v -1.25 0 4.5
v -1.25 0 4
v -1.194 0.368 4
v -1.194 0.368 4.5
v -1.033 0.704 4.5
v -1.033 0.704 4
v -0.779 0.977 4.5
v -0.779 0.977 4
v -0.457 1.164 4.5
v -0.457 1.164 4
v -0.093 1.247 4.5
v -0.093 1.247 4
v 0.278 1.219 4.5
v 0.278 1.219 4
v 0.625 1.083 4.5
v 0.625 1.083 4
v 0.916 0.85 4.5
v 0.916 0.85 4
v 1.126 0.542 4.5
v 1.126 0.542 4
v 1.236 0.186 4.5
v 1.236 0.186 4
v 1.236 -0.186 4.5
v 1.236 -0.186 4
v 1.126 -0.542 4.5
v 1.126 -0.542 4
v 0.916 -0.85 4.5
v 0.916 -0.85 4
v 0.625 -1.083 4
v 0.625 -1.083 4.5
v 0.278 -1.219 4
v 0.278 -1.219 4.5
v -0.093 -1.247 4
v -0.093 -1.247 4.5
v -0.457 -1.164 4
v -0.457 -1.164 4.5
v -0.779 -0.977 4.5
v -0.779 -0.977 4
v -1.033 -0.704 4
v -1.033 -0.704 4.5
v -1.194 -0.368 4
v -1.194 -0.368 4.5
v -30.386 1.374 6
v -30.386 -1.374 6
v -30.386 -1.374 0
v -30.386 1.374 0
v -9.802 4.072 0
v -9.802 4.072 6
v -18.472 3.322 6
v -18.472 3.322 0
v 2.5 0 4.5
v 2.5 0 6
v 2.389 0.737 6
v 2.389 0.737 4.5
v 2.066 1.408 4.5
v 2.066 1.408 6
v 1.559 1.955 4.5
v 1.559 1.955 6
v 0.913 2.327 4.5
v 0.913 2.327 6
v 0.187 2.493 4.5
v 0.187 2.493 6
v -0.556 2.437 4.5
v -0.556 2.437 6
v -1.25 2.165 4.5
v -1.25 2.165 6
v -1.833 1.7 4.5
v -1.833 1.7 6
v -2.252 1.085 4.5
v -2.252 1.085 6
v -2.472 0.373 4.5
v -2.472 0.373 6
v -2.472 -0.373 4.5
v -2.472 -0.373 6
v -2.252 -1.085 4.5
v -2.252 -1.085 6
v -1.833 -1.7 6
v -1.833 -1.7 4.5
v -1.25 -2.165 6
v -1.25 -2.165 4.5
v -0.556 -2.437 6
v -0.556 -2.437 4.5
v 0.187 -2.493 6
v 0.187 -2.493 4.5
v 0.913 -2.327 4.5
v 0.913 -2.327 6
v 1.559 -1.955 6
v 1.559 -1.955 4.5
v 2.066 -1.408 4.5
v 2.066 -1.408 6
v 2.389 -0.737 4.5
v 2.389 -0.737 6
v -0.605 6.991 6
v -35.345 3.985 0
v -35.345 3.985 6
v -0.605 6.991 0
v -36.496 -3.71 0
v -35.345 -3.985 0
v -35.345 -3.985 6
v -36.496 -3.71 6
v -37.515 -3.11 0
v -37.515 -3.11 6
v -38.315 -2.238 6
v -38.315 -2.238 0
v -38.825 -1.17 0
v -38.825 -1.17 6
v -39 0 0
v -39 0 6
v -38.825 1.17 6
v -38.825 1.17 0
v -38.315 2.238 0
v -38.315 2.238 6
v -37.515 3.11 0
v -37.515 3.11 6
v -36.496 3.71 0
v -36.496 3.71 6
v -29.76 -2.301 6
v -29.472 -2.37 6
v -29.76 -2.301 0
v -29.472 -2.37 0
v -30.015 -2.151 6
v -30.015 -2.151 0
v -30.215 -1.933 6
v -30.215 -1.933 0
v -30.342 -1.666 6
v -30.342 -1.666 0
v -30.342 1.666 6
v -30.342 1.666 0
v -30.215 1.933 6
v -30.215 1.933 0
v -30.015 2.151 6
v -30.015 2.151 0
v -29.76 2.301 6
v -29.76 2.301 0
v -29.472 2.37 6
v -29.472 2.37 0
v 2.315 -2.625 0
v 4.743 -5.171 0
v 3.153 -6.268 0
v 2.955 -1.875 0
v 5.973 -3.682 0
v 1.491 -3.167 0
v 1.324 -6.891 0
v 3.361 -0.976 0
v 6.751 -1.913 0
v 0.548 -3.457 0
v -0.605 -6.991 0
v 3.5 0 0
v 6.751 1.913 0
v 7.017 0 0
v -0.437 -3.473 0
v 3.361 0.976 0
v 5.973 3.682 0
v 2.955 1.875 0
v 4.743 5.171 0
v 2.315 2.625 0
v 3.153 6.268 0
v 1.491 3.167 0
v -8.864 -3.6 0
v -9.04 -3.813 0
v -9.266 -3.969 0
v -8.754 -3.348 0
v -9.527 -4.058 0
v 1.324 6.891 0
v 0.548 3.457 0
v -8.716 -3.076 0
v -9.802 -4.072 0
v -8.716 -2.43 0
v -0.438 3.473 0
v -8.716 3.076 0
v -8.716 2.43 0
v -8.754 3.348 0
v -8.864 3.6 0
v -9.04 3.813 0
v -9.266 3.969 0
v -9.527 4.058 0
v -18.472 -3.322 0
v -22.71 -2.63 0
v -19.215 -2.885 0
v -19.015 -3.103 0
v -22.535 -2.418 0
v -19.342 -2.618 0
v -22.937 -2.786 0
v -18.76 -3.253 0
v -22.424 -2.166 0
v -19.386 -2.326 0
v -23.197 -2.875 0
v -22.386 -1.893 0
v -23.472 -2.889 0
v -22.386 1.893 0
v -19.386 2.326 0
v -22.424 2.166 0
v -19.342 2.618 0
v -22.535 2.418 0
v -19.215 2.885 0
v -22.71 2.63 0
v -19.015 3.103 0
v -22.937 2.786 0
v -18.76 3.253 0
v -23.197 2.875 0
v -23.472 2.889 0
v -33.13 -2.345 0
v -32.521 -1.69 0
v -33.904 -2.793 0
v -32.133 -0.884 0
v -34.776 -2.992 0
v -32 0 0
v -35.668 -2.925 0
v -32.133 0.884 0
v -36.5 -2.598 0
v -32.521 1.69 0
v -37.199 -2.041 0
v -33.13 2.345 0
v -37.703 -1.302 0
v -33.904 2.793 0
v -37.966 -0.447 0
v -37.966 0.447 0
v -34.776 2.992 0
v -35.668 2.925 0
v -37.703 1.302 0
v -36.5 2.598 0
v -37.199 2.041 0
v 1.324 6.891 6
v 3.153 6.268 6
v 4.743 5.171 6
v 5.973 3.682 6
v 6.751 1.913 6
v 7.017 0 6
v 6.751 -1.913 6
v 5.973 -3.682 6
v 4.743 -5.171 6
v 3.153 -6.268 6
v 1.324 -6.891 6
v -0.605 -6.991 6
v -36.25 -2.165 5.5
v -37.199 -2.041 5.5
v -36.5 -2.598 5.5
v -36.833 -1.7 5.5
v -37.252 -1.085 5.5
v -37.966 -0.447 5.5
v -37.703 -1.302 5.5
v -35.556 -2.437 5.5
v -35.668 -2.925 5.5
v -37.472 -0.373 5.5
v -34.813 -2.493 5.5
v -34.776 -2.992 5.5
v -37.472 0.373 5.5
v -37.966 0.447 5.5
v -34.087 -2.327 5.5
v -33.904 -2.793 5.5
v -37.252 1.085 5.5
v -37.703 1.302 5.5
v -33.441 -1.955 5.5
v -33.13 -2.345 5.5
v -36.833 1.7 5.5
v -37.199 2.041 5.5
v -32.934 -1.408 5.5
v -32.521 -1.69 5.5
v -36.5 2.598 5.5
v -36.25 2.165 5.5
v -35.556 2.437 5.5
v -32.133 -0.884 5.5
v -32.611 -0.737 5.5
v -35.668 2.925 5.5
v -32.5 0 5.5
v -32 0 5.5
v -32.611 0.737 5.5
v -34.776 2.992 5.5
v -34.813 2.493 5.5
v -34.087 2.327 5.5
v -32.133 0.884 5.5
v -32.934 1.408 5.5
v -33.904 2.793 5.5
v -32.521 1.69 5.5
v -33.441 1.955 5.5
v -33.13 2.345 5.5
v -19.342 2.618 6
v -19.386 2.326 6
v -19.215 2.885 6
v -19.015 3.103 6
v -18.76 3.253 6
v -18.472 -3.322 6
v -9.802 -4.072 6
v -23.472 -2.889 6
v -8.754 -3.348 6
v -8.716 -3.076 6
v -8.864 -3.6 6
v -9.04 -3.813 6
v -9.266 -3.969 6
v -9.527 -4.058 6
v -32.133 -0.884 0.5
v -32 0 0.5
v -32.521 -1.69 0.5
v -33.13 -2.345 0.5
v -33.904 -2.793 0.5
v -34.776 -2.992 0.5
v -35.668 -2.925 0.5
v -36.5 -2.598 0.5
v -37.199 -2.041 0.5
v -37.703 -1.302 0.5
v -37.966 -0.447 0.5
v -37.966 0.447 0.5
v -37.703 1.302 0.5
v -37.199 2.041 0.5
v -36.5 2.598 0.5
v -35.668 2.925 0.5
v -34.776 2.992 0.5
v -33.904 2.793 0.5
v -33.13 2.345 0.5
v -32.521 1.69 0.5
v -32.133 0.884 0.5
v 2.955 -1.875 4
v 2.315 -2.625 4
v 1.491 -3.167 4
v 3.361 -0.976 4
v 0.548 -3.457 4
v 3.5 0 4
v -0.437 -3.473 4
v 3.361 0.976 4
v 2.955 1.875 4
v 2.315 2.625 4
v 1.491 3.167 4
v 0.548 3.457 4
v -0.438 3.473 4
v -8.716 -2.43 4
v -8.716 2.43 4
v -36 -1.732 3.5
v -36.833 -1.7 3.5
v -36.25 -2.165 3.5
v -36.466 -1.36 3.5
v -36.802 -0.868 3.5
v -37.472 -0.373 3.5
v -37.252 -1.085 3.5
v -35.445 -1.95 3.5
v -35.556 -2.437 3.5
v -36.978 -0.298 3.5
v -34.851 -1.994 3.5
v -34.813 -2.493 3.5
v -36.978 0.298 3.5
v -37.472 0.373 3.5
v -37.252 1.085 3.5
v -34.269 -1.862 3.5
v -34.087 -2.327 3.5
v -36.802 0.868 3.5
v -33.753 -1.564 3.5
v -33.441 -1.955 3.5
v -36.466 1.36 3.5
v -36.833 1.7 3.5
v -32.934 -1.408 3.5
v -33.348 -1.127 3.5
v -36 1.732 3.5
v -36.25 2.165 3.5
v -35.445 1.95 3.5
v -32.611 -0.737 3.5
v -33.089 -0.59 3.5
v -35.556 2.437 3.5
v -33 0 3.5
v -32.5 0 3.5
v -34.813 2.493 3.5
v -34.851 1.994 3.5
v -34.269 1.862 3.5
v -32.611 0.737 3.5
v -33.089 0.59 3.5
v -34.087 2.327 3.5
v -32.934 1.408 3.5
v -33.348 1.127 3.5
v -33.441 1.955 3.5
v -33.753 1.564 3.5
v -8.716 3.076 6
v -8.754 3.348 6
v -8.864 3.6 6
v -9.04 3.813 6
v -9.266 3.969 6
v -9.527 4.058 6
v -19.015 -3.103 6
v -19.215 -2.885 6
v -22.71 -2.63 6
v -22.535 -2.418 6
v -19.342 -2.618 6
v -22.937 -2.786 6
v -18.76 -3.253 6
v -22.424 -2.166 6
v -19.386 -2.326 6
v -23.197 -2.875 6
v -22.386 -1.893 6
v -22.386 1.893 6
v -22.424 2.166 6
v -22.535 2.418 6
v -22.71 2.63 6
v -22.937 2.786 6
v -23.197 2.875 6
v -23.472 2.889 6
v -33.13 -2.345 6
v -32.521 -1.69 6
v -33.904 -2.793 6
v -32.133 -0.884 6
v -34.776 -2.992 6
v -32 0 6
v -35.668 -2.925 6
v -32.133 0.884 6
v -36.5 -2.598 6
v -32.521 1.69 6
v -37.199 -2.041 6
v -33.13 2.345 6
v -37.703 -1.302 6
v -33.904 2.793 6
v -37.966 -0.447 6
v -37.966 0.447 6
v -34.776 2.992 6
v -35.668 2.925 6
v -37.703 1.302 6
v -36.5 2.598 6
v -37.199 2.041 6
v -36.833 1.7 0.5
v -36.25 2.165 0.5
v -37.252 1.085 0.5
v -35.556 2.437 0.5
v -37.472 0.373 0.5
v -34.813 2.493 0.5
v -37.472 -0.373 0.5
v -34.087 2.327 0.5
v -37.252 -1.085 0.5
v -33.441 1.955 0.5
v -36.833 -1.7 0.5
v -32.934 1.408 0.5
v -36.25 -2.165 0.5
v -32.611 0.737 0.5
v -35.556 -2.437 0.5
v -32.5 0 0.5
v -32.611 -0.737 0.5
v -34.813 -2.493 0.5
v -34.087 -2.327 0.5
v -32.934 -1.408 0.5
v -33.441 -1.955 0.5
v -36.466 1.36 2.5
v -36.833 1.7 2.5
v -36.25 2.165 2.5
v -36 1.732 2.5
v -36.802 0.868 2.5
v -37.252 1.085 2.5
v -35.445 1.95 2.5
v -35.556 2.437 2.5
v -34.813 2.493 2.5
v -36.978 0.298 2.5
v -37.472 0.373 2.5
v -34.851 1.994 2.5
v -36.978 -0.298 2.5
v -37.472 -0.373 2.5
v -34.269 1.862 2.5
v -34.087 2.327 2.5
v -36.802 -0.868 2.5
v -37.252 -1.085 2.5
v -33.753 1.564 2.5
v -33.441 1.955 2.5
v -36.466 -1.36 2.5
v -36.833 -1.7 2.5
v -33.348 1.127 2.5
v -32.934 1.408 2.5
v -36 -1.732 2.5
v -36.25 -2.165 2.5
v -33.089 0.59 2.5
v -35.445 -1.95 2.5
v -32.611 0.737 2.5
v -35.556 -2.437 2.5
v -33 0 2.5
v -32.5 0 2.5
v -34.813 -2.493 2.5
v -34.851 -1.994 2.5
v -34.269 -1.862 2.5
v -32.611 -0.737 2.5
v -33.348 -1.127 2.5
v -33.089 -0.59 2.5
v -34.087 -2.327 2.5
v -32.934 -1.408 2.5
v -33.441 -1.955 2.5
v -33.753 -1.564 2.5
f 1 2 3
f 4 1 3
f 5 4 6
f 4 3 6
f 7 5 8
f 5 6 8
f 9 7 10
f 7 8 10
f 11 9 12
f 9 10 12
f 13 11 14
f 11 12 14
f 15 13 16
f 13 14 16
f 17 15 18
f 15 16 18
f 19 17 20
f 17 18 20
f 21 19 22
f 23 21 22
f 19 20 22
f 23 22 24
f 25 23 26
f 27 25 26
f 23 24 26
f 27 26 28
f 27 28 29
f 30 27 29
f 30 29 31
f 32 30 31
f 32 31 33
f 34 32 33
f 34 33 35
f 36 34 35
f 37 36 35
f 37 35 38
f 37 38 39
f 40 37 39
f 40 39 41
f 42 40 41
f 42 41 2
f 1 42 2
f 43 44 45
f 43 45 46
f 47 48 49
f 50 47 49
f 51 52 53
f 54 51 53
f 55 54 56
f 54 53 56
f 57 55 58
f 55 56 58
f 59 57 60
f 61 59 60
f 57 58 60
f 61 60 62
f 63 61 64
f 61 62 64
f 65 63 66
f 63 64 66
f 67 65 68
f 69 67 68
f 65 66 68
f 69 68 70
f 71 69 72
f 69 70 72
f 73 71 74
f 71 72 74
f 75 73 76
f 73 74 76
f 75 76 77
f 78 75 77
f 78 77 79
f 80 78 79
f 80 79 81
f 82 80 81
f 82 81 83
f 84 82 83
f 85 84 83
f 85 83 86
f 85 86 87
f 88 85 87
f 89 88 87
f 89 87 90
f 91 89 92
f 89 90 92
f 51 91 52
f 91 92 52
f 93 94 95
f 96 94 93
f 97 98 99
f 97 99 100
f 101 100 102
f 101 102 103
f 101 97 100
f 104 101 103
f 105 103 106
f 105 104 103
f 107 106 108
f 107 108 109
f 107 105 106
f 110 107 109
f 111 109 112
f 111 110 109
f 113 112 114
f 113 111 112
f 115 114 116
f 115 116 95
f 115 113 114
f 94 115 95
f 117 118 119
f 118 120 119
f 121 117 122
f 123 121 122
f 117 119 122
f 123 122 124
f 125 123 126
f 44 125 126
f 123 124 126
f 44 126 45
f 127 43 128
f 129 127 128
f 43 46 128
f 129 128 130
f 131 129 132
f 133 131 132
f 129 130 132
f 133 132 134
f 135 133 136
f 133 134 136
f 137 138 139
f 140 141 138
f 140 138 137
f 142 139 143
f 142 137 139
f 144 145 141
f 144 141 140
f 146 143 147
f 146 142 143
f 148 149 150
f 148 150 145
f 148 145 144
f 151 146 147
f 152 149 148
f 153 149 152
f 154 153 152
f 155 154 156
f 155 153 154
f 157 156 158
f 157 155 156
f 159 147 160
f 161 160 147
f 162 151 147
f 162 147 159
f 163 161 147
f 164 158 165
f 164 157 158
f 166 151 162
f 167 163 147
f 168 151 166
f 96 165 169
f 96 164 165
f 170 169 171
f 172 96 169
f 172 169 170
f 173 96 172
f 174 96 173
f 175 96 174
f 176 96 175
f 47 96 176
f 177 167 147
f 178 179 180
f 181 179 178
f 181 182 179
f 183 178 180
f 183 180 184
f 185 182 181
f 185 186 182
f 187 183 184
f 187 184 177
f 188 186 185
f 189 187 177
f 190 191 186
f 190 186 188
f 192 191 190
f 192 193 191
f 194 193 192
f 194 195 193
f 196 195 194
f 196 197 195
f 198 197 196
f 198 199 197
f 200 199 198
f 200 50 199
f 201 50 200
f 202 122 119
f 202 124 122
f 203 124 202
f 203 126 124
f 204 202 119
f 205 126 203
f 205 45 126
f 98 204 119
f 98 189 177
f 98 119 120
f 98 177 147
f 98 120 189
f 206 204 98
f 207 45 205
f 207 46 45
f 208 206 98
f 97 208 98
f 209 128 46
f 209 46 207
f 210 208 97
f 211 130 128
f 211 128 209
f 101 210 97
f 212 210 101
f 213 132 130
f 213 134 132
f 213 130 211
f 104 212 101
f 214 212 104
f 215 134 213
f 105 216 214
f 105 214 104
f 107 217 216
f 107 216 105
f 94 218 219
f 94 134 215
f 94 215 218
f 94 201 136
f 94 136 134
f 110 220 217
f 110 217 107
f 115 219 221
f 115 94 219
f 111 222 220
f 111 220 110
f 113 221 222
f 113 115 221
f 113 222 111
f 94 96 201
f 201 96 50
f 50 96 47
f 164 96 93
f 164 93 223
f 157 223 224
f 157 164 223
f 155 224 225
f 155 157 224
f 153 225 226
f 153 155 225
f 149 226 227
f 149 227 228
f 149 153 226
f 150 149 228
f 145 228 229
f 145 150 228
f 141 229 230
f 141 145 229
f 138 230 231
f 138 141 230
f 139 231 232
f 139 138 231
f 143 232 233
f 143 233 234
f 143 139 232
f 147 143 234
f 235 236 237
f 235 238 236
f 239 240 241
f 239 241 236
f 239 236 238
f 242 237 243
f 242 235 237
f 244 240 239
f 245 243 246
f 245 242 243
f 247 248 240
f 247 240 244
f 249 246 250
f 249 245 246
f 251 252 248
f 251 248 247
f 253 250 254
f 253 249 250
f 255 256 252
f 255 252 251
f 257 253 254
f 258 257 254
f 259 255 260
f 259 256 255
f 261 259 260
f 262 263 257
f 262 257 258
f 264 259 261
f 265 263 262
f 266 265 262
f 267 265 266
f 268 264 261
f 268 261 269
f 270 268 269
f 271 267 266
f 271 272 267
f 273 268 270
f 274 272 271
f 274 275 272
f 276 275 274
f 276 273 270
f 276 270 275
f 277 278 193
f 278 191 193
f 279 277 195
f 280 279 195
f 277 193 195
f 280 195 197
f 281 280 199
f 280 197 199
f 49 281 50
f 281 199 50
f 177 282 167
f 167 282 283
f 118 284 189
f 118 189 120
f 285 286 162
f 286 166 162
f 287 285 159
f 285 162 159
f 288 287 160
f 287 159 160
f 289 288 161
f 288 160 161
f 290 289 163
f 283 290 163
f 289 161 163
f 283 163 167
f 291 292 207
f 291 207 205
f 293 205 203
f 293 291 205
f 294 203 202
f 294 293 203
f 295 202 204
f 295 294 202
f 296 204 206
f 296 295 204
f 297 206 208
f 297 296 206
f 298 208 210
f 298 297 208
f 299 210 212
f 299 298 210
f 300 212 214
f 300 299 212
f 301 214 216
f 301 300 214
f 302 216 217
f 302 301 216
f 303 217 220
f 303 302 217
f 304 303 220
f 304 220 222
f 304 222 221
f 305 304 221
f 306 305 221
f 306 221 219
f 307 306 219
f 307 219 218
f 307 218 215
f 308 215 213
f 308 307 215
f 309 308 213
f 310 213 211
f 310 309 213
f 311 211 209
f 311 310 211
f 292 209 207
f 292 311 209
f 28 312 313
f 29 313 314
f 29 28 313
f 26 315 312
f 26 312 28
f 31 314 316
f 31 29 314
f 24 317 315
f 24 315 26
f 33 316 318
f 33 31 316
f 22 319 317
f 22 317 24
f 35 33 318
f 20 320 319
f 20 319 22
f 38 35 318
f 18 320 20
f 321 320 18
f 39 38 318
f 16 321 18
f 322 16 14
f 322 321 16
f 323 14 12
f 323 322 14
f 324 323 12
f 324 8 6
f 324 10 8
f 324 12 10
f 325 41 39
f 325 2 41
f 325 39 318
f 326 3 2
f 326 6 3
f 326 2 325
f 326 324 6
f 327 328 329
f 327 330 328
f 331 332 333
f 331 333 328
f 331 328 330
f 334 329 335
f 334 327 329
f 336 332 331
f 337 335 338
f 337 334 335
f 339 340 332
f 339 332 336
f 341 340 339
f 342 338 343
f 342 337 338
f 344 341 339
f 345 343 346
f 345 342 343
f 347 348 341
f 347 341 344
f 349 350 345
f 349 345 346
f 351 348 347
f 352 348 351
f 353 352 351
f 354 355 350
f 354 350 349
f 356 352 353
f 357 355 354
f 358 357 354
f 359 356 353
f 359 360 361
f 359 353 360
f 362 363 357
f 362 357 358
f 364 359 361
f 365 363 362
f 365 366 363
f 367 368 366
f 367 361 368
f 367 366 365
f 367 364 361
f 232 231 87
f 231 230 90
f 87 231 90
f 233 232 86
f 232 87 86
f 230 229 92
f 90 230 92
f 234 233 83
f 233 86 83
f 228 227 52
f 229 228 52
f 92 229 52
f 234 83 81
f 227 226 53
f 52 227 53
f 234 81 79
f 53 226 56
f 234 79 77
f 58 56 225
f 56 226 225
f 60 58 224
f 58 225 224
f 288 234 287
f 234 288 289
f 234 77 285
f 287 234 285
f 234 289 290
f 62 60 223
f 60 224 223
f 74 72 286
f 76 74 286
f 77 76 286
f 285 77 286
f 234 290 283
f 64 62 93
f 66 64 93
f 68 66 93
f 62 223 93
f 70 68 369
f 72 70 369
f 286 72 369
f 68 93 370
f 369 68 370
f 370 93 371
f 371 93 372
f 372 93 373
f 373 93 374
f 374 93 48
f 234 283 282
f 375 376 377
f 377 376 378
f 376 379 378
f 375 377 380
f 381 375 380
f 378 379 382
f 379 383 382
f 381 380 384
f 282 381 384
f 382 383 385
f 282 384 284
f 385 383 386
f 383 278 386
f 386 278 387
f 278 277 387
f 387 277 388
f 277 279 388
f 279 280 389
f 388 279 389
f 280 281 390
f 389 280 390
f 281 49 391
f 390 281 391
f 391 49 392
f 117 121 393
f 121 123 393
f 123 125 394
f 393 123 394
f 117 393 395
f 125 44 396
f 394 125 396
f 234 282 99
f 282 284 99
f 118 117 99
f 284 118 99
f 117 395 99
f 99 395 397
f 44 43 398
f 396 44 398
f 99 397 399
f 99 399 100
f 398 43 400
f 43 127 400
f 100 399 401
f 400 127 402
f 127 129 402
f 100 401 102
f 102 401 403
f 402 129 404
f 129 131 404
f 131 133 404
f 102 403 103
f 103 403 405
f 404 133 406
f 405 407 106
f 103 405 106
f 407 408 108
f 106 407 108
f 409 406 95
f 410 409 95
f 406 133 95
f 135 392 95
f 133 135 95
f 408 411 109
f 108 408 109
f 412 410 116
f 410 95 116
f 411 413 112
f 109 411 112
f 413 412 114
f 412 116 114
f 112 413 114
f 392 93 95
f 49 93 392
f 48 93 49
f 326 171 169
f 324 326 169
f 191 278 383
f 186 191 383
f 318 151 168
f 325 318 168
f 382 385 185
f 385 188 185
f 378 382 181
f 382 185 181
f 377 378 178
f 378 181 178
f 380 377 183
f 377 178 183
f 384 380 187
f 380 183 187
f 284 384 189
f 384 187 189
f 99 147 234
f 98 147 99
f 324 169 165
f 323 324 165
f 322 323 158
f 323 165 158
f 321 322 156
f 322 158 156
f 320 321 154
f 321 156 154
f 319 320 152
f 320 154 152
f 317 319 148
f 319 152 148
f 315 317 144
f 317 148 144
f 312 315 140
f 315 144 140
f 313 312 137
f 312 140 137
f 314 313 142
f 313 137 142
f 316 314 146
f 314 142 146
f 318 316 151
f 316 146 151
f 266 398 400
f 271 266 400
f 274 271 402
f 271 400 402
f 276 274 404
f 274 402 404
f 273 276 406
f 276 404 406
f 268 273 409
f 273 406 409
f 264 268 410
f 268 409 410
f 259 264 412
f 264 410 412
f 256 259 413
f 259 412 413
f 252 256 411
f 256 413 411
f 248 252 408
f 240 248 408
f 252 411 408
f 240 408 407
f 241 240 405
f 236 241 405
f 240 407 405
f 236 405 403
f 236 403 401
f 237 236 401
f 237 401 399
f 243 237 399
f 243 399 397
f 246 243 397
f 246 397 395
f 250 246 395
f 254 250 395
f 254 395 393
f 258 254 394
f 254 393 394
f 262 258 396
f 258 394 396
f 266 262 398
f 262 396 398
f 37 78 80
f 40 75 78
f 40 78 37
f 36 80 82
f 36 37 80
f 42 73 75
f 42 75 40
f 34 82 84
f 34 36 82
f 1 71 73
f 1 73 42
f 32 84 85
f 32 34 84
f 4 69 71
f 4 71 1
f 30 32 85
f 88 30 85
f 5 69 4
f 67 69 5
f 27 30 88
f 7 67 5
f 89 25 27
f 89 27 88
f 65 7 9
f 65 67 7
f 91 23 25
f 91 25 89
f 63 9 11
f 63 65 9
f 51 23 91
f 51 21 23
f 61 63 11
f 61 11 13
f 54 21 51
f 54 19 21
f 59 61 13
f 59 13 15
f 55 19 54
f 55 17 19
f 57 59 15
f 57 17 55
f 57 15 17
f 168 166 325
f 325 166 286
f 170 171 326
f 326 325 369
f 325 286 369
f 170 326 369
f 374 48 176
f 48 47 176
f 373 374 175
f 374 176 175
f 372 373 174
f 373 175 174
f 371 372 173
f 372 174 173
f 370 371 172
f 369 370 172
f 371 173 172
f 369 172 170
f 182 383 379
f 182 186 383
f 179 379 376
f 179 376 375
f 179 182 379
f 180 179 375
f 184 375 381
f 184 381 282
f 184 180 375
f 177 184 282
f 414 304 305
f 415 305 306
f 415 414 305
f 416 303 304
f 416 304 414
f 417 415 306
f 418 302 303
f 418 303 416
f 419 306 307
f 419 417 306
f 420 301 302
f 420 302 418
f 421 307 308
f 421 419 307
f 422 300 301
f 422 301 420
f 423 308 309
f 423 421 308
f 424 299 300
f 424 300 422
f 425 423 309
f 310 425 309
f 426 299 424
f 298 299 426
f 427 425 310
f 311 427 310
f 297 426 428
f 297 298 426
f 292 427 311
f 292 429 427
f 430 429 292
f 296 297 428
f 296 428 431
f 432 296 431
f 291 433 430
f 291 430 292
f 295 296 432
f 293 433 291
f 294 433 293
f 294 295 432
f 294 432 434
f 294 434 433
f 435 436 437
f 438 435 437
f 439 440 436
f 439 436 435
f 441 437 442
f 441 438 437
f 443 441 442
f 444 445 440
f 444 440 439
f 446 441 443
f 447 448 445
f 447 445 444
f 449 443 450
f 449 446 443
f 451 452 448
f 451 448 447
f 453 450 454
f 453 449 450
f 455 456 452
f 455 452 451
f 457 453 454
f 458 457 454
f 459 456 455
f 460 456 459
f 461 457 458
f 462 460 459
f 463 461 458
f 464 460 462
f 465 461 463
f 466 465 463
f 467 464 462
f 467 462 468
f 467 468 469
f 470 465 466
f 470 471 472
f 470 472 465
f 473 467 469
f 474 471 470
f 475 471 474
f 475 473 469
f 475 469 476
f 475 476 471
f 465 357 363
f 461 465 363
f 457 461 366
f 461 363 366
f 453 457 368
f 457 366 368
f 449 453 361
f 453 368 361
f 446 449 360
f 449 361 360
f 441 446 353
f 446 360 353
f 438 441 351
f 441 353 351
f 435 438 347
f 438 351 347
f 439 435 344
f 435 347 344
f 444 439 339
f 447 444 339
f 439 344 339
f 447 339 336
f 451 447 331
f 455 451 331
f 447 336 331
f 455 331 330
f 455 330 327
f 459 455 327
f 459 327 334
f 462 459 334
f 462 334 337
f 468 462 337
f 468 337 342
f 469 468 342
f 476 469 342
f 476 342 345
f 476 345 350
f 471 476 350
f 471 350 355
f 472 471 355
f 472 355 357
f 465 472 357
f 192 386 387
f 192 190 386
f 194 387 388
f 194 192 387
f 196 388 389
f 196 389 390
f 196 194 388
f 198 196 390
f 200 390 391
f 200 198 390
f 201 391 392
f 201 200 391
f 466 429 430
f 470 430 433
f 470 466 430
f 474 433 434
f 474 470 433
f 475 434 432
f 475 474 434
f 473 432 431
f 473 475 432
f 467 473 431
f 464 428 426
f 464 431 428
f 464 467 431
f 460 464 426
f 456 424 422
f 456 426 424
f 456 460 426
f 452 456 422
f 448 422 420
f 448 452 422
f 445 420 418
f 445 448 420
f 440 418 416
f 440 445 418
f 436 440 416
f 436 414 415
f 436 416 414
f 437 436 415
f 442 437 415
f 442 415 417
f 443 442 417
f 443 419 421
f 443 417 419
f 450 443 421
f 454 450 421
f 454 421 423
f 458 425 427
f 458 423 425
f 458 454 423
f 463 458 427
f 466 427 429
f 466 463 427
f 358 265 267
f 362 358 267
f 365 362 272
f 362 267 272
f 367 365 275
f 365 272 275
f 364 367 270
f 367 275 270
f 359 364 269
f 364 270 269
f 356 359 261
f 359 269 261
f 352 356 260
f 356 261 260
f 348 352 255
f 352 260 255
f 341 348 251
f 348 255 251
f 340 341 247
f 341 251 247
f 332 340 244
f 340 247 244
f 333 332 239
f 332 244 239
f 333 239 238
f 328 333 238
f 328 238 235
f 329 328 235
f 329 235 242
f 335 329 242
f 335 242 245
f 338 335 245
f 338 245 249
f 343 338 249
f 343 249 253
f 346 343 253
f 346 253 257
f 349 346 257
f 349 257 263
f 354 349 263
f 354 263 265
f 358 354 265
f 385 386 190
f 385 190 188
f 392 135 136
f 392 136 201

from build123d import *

# Parameters (mm, degrees)
EXTRUDE_1_DEPTH      = 6
CUT_EXTRUDE_1_DEPTH  = 41.077836542
FILLET_1_R           = 1
SKETCH_7_R           = 2
CUT_EXTRUDE_2_DEPTH  = 41.077836542
SKETCH_7_4_R         = 2.5
SKETCH_7_4_R_2       = 2
CUT_EXTRUDE_4_DEPTH  = 2.5
SKETCH_7_5_R         = 3
SKETCH_7_5_R_2       = 2.5
CUT_EXTRUDE_5_DEPTH  = 0.5
CUT_EXTRUDE_9_DEPTH  = 4
SKETCH_13_R          = 1.25
CUT_EXTRUDE_10_DEPTH = 40.827540495
SKETCH_14_R          = 2.5
CUT_EXTRUDE_11_DEPTH = 1.5
CUT_EXTRUDE_START    = -2.5
SKETCH_15_R          = 2.5
CUT_EXTRUDE_13_DEPTH = 2.5
CUT_EXTRUDE_START_2  = -0.5
SKETCH_15_4_R        = 3
SKETCH_15_4_R_2      = 2.5
CUT_EXTRUDE_14_DEPTH = 0.5


with BuildPart() as part:
    # 草图2 → 凸台-拉伸1 (new body)
    with BuildSketch(Plane.XY):
        with BuildLine():
            Line((-35.344756781, 3.98511515), (-0.604756988, 6.99051149))
            ThreePointArc((-0.604756988, 6.99051149), (7.01662183, 0), (-0.604756988, -6.99051149))
            Line((-0.604756988, -6.99051149), (-35.344756781, -3.98511515))
            ThreePointArc((-35.344756781, -3.98511515), (-39, 0), (-35.344756781, 3.98511515))
        make_face()
    extrude(amount=EXTRUDE_1_DEPTH)

    # 草图6 → 切除-拉伸1 (cut, through all)
    with BuildSketch(Plane.XY.offset(6)):
        Polygon((-30.385995652, 2.291125705), (-22.385995652, 2.983214677), (-22.385995652, -2.983214677), (-30.385995652, -2.291125705), align=None)
        Polygon((-19.385995652, 3.242748041), (-19.385995652, -3.242748041), (-8.71565209, -4.165851428), (-8.71565209, 4.165851428), align=None)
    extrude(amount=-CUT_EXTRUDE_1_DEPTH, mode=Mode.SUBTRACT)

    # 圆角1
    fillet_1_edges = [part.edges().sort_by_distance(p)[0] for p in [
        (-8.71565209, -4.165851428, 3),
        (-8.71565209, 4.165851428, 3),
        (-19.385995652, -3.242748041, 3),
        (-19.385995652, 3.242748041, 3),
        (-22.385995652, -2.983214677, 3),
        (-22.385995652, 2.983214677, 3),
        (-30.385995652, -2.291125705, 3),
        (-30.385995652, 2.291125705, 3),
    ]]
    fillet(fillet_1_edges, radius=FILLET_1_R)

    # 草图7 → 切除-拉伸2 (cut, through all)
    with BuildSketch(Plane.XY.offset(6)):
        with Locations((-35, 0)):
            Circle(SKETCH_7_R)
    extrude(amount=-CUT_EXTRUDE_2_DEPTH, mode=Mode.SUBTRACT)

    # 草图7<4> → 切除-拉伸4 (cut)
    with BuildSketch(Plane.XY.offset(6)):
        with Locations((-35, 0)):
            Circle(SKETCH_7_4_R)
        with Locations((-35, 0)):
            Circle(SKETCH_7_4_R_2, mode=Mode.SUBTRACT)
    extrude(amount=-CUT_EXTRUDE_4_DEPTH, mode=Mode.SUBTRACT)

    # 草图7<5> → 切除-拉伸5 (cut)
    with BuildSketch(Plane.XY.offset(6)):
        with Locations((-35, 0)):
            Circle(SKETCH_7_5_R)
        with Locations((-35, 0)):
            Circle(SKETCH_7_5_R_2, mode=Mode.SUBTRACT)
    extrude(amount=-CUT_EXTRUDE_5_DEPTH, mode=Mode.SUBTRACT)

    # 草图12 → 切除-拉伸9 (cut)
    with BuildSketch(Plane(origin=(0, 0, 0), x_dir=(-1, 0, 0), z_dir=(0, 0, -1))):
        with BuildLine():
            Line((12.25, 1.984313483), (0.4375, 3.472548596))
            ThreePointArc((0.4375, 3.472548596), (-3.5, 0), (0.4375, -3.472548596))
            Line((0.4375, -3.472548596), (12.25, -1.984313483))
            ThreePointArc((12.25, -1.984313483), (14, 0), (12.25, 1.984313483))
        make_face()
    extrude(amount=-CUT_EXTRUDE_9_DEPTH, mode=Mode.SUBTRACT)

    # 草图13 → 切除-拉伸10 (cut, through all)
    with BuildSketch(Plane(origin=(0, 0, 4), x_dir=(-1, 0, 0), z_dir=(0, 0, -1))):
        Circle(SKETCH_13_R)
    extrude(amount=-CUT_EXTRUDE_10_DEPTH, mode=Mode.SUBTRACT)

    # 草图14 → 切除-拉伸11 (cut)
    with BuildSketch(Plane.XY.offset(6)):
        Circle(SKETCH_14_R)
    extrude(amount=-CUT_EXTRUDE_11_DEPTH, mode=Mode.SUBTRACT)

    # 草图15 → 切除-拉伸13 (cut)
    with BuildSketch(Plane(origin=(0, 0, 0), x_dir=(-1, 0, 0), z_dir=(0, 0, -1)).offset(CUT_EXTRUDE_START)):
        with Locations((35, 0)):
            Circle(SKETCH_15_R)
    extrude(amount=CUT_EXTRUDE_13_DEPTH, mode=Mode.SUBTRACT)

    # 草图15<4> → 切除-拉伸14 (cut)
    with BuildSketch(Plane(origin=(0, 0, 0), x_dir=(-1, 0, 0), z_dir=(0, 0, -1)).offset(CUT_EXTRUDE_START_2)):
        with Locations((35, 0)):
            Circle(SKETCH_15_4_R)
        with Locations((35, 0)):
            Circle(SKETCH_15_4_R_2, mode=Mode.SUBTRACT)
    extrude(amount=CUT_EXTRUDE_14_DEPTH, mode=Mode.SUBTRACT)


solid = part.part
